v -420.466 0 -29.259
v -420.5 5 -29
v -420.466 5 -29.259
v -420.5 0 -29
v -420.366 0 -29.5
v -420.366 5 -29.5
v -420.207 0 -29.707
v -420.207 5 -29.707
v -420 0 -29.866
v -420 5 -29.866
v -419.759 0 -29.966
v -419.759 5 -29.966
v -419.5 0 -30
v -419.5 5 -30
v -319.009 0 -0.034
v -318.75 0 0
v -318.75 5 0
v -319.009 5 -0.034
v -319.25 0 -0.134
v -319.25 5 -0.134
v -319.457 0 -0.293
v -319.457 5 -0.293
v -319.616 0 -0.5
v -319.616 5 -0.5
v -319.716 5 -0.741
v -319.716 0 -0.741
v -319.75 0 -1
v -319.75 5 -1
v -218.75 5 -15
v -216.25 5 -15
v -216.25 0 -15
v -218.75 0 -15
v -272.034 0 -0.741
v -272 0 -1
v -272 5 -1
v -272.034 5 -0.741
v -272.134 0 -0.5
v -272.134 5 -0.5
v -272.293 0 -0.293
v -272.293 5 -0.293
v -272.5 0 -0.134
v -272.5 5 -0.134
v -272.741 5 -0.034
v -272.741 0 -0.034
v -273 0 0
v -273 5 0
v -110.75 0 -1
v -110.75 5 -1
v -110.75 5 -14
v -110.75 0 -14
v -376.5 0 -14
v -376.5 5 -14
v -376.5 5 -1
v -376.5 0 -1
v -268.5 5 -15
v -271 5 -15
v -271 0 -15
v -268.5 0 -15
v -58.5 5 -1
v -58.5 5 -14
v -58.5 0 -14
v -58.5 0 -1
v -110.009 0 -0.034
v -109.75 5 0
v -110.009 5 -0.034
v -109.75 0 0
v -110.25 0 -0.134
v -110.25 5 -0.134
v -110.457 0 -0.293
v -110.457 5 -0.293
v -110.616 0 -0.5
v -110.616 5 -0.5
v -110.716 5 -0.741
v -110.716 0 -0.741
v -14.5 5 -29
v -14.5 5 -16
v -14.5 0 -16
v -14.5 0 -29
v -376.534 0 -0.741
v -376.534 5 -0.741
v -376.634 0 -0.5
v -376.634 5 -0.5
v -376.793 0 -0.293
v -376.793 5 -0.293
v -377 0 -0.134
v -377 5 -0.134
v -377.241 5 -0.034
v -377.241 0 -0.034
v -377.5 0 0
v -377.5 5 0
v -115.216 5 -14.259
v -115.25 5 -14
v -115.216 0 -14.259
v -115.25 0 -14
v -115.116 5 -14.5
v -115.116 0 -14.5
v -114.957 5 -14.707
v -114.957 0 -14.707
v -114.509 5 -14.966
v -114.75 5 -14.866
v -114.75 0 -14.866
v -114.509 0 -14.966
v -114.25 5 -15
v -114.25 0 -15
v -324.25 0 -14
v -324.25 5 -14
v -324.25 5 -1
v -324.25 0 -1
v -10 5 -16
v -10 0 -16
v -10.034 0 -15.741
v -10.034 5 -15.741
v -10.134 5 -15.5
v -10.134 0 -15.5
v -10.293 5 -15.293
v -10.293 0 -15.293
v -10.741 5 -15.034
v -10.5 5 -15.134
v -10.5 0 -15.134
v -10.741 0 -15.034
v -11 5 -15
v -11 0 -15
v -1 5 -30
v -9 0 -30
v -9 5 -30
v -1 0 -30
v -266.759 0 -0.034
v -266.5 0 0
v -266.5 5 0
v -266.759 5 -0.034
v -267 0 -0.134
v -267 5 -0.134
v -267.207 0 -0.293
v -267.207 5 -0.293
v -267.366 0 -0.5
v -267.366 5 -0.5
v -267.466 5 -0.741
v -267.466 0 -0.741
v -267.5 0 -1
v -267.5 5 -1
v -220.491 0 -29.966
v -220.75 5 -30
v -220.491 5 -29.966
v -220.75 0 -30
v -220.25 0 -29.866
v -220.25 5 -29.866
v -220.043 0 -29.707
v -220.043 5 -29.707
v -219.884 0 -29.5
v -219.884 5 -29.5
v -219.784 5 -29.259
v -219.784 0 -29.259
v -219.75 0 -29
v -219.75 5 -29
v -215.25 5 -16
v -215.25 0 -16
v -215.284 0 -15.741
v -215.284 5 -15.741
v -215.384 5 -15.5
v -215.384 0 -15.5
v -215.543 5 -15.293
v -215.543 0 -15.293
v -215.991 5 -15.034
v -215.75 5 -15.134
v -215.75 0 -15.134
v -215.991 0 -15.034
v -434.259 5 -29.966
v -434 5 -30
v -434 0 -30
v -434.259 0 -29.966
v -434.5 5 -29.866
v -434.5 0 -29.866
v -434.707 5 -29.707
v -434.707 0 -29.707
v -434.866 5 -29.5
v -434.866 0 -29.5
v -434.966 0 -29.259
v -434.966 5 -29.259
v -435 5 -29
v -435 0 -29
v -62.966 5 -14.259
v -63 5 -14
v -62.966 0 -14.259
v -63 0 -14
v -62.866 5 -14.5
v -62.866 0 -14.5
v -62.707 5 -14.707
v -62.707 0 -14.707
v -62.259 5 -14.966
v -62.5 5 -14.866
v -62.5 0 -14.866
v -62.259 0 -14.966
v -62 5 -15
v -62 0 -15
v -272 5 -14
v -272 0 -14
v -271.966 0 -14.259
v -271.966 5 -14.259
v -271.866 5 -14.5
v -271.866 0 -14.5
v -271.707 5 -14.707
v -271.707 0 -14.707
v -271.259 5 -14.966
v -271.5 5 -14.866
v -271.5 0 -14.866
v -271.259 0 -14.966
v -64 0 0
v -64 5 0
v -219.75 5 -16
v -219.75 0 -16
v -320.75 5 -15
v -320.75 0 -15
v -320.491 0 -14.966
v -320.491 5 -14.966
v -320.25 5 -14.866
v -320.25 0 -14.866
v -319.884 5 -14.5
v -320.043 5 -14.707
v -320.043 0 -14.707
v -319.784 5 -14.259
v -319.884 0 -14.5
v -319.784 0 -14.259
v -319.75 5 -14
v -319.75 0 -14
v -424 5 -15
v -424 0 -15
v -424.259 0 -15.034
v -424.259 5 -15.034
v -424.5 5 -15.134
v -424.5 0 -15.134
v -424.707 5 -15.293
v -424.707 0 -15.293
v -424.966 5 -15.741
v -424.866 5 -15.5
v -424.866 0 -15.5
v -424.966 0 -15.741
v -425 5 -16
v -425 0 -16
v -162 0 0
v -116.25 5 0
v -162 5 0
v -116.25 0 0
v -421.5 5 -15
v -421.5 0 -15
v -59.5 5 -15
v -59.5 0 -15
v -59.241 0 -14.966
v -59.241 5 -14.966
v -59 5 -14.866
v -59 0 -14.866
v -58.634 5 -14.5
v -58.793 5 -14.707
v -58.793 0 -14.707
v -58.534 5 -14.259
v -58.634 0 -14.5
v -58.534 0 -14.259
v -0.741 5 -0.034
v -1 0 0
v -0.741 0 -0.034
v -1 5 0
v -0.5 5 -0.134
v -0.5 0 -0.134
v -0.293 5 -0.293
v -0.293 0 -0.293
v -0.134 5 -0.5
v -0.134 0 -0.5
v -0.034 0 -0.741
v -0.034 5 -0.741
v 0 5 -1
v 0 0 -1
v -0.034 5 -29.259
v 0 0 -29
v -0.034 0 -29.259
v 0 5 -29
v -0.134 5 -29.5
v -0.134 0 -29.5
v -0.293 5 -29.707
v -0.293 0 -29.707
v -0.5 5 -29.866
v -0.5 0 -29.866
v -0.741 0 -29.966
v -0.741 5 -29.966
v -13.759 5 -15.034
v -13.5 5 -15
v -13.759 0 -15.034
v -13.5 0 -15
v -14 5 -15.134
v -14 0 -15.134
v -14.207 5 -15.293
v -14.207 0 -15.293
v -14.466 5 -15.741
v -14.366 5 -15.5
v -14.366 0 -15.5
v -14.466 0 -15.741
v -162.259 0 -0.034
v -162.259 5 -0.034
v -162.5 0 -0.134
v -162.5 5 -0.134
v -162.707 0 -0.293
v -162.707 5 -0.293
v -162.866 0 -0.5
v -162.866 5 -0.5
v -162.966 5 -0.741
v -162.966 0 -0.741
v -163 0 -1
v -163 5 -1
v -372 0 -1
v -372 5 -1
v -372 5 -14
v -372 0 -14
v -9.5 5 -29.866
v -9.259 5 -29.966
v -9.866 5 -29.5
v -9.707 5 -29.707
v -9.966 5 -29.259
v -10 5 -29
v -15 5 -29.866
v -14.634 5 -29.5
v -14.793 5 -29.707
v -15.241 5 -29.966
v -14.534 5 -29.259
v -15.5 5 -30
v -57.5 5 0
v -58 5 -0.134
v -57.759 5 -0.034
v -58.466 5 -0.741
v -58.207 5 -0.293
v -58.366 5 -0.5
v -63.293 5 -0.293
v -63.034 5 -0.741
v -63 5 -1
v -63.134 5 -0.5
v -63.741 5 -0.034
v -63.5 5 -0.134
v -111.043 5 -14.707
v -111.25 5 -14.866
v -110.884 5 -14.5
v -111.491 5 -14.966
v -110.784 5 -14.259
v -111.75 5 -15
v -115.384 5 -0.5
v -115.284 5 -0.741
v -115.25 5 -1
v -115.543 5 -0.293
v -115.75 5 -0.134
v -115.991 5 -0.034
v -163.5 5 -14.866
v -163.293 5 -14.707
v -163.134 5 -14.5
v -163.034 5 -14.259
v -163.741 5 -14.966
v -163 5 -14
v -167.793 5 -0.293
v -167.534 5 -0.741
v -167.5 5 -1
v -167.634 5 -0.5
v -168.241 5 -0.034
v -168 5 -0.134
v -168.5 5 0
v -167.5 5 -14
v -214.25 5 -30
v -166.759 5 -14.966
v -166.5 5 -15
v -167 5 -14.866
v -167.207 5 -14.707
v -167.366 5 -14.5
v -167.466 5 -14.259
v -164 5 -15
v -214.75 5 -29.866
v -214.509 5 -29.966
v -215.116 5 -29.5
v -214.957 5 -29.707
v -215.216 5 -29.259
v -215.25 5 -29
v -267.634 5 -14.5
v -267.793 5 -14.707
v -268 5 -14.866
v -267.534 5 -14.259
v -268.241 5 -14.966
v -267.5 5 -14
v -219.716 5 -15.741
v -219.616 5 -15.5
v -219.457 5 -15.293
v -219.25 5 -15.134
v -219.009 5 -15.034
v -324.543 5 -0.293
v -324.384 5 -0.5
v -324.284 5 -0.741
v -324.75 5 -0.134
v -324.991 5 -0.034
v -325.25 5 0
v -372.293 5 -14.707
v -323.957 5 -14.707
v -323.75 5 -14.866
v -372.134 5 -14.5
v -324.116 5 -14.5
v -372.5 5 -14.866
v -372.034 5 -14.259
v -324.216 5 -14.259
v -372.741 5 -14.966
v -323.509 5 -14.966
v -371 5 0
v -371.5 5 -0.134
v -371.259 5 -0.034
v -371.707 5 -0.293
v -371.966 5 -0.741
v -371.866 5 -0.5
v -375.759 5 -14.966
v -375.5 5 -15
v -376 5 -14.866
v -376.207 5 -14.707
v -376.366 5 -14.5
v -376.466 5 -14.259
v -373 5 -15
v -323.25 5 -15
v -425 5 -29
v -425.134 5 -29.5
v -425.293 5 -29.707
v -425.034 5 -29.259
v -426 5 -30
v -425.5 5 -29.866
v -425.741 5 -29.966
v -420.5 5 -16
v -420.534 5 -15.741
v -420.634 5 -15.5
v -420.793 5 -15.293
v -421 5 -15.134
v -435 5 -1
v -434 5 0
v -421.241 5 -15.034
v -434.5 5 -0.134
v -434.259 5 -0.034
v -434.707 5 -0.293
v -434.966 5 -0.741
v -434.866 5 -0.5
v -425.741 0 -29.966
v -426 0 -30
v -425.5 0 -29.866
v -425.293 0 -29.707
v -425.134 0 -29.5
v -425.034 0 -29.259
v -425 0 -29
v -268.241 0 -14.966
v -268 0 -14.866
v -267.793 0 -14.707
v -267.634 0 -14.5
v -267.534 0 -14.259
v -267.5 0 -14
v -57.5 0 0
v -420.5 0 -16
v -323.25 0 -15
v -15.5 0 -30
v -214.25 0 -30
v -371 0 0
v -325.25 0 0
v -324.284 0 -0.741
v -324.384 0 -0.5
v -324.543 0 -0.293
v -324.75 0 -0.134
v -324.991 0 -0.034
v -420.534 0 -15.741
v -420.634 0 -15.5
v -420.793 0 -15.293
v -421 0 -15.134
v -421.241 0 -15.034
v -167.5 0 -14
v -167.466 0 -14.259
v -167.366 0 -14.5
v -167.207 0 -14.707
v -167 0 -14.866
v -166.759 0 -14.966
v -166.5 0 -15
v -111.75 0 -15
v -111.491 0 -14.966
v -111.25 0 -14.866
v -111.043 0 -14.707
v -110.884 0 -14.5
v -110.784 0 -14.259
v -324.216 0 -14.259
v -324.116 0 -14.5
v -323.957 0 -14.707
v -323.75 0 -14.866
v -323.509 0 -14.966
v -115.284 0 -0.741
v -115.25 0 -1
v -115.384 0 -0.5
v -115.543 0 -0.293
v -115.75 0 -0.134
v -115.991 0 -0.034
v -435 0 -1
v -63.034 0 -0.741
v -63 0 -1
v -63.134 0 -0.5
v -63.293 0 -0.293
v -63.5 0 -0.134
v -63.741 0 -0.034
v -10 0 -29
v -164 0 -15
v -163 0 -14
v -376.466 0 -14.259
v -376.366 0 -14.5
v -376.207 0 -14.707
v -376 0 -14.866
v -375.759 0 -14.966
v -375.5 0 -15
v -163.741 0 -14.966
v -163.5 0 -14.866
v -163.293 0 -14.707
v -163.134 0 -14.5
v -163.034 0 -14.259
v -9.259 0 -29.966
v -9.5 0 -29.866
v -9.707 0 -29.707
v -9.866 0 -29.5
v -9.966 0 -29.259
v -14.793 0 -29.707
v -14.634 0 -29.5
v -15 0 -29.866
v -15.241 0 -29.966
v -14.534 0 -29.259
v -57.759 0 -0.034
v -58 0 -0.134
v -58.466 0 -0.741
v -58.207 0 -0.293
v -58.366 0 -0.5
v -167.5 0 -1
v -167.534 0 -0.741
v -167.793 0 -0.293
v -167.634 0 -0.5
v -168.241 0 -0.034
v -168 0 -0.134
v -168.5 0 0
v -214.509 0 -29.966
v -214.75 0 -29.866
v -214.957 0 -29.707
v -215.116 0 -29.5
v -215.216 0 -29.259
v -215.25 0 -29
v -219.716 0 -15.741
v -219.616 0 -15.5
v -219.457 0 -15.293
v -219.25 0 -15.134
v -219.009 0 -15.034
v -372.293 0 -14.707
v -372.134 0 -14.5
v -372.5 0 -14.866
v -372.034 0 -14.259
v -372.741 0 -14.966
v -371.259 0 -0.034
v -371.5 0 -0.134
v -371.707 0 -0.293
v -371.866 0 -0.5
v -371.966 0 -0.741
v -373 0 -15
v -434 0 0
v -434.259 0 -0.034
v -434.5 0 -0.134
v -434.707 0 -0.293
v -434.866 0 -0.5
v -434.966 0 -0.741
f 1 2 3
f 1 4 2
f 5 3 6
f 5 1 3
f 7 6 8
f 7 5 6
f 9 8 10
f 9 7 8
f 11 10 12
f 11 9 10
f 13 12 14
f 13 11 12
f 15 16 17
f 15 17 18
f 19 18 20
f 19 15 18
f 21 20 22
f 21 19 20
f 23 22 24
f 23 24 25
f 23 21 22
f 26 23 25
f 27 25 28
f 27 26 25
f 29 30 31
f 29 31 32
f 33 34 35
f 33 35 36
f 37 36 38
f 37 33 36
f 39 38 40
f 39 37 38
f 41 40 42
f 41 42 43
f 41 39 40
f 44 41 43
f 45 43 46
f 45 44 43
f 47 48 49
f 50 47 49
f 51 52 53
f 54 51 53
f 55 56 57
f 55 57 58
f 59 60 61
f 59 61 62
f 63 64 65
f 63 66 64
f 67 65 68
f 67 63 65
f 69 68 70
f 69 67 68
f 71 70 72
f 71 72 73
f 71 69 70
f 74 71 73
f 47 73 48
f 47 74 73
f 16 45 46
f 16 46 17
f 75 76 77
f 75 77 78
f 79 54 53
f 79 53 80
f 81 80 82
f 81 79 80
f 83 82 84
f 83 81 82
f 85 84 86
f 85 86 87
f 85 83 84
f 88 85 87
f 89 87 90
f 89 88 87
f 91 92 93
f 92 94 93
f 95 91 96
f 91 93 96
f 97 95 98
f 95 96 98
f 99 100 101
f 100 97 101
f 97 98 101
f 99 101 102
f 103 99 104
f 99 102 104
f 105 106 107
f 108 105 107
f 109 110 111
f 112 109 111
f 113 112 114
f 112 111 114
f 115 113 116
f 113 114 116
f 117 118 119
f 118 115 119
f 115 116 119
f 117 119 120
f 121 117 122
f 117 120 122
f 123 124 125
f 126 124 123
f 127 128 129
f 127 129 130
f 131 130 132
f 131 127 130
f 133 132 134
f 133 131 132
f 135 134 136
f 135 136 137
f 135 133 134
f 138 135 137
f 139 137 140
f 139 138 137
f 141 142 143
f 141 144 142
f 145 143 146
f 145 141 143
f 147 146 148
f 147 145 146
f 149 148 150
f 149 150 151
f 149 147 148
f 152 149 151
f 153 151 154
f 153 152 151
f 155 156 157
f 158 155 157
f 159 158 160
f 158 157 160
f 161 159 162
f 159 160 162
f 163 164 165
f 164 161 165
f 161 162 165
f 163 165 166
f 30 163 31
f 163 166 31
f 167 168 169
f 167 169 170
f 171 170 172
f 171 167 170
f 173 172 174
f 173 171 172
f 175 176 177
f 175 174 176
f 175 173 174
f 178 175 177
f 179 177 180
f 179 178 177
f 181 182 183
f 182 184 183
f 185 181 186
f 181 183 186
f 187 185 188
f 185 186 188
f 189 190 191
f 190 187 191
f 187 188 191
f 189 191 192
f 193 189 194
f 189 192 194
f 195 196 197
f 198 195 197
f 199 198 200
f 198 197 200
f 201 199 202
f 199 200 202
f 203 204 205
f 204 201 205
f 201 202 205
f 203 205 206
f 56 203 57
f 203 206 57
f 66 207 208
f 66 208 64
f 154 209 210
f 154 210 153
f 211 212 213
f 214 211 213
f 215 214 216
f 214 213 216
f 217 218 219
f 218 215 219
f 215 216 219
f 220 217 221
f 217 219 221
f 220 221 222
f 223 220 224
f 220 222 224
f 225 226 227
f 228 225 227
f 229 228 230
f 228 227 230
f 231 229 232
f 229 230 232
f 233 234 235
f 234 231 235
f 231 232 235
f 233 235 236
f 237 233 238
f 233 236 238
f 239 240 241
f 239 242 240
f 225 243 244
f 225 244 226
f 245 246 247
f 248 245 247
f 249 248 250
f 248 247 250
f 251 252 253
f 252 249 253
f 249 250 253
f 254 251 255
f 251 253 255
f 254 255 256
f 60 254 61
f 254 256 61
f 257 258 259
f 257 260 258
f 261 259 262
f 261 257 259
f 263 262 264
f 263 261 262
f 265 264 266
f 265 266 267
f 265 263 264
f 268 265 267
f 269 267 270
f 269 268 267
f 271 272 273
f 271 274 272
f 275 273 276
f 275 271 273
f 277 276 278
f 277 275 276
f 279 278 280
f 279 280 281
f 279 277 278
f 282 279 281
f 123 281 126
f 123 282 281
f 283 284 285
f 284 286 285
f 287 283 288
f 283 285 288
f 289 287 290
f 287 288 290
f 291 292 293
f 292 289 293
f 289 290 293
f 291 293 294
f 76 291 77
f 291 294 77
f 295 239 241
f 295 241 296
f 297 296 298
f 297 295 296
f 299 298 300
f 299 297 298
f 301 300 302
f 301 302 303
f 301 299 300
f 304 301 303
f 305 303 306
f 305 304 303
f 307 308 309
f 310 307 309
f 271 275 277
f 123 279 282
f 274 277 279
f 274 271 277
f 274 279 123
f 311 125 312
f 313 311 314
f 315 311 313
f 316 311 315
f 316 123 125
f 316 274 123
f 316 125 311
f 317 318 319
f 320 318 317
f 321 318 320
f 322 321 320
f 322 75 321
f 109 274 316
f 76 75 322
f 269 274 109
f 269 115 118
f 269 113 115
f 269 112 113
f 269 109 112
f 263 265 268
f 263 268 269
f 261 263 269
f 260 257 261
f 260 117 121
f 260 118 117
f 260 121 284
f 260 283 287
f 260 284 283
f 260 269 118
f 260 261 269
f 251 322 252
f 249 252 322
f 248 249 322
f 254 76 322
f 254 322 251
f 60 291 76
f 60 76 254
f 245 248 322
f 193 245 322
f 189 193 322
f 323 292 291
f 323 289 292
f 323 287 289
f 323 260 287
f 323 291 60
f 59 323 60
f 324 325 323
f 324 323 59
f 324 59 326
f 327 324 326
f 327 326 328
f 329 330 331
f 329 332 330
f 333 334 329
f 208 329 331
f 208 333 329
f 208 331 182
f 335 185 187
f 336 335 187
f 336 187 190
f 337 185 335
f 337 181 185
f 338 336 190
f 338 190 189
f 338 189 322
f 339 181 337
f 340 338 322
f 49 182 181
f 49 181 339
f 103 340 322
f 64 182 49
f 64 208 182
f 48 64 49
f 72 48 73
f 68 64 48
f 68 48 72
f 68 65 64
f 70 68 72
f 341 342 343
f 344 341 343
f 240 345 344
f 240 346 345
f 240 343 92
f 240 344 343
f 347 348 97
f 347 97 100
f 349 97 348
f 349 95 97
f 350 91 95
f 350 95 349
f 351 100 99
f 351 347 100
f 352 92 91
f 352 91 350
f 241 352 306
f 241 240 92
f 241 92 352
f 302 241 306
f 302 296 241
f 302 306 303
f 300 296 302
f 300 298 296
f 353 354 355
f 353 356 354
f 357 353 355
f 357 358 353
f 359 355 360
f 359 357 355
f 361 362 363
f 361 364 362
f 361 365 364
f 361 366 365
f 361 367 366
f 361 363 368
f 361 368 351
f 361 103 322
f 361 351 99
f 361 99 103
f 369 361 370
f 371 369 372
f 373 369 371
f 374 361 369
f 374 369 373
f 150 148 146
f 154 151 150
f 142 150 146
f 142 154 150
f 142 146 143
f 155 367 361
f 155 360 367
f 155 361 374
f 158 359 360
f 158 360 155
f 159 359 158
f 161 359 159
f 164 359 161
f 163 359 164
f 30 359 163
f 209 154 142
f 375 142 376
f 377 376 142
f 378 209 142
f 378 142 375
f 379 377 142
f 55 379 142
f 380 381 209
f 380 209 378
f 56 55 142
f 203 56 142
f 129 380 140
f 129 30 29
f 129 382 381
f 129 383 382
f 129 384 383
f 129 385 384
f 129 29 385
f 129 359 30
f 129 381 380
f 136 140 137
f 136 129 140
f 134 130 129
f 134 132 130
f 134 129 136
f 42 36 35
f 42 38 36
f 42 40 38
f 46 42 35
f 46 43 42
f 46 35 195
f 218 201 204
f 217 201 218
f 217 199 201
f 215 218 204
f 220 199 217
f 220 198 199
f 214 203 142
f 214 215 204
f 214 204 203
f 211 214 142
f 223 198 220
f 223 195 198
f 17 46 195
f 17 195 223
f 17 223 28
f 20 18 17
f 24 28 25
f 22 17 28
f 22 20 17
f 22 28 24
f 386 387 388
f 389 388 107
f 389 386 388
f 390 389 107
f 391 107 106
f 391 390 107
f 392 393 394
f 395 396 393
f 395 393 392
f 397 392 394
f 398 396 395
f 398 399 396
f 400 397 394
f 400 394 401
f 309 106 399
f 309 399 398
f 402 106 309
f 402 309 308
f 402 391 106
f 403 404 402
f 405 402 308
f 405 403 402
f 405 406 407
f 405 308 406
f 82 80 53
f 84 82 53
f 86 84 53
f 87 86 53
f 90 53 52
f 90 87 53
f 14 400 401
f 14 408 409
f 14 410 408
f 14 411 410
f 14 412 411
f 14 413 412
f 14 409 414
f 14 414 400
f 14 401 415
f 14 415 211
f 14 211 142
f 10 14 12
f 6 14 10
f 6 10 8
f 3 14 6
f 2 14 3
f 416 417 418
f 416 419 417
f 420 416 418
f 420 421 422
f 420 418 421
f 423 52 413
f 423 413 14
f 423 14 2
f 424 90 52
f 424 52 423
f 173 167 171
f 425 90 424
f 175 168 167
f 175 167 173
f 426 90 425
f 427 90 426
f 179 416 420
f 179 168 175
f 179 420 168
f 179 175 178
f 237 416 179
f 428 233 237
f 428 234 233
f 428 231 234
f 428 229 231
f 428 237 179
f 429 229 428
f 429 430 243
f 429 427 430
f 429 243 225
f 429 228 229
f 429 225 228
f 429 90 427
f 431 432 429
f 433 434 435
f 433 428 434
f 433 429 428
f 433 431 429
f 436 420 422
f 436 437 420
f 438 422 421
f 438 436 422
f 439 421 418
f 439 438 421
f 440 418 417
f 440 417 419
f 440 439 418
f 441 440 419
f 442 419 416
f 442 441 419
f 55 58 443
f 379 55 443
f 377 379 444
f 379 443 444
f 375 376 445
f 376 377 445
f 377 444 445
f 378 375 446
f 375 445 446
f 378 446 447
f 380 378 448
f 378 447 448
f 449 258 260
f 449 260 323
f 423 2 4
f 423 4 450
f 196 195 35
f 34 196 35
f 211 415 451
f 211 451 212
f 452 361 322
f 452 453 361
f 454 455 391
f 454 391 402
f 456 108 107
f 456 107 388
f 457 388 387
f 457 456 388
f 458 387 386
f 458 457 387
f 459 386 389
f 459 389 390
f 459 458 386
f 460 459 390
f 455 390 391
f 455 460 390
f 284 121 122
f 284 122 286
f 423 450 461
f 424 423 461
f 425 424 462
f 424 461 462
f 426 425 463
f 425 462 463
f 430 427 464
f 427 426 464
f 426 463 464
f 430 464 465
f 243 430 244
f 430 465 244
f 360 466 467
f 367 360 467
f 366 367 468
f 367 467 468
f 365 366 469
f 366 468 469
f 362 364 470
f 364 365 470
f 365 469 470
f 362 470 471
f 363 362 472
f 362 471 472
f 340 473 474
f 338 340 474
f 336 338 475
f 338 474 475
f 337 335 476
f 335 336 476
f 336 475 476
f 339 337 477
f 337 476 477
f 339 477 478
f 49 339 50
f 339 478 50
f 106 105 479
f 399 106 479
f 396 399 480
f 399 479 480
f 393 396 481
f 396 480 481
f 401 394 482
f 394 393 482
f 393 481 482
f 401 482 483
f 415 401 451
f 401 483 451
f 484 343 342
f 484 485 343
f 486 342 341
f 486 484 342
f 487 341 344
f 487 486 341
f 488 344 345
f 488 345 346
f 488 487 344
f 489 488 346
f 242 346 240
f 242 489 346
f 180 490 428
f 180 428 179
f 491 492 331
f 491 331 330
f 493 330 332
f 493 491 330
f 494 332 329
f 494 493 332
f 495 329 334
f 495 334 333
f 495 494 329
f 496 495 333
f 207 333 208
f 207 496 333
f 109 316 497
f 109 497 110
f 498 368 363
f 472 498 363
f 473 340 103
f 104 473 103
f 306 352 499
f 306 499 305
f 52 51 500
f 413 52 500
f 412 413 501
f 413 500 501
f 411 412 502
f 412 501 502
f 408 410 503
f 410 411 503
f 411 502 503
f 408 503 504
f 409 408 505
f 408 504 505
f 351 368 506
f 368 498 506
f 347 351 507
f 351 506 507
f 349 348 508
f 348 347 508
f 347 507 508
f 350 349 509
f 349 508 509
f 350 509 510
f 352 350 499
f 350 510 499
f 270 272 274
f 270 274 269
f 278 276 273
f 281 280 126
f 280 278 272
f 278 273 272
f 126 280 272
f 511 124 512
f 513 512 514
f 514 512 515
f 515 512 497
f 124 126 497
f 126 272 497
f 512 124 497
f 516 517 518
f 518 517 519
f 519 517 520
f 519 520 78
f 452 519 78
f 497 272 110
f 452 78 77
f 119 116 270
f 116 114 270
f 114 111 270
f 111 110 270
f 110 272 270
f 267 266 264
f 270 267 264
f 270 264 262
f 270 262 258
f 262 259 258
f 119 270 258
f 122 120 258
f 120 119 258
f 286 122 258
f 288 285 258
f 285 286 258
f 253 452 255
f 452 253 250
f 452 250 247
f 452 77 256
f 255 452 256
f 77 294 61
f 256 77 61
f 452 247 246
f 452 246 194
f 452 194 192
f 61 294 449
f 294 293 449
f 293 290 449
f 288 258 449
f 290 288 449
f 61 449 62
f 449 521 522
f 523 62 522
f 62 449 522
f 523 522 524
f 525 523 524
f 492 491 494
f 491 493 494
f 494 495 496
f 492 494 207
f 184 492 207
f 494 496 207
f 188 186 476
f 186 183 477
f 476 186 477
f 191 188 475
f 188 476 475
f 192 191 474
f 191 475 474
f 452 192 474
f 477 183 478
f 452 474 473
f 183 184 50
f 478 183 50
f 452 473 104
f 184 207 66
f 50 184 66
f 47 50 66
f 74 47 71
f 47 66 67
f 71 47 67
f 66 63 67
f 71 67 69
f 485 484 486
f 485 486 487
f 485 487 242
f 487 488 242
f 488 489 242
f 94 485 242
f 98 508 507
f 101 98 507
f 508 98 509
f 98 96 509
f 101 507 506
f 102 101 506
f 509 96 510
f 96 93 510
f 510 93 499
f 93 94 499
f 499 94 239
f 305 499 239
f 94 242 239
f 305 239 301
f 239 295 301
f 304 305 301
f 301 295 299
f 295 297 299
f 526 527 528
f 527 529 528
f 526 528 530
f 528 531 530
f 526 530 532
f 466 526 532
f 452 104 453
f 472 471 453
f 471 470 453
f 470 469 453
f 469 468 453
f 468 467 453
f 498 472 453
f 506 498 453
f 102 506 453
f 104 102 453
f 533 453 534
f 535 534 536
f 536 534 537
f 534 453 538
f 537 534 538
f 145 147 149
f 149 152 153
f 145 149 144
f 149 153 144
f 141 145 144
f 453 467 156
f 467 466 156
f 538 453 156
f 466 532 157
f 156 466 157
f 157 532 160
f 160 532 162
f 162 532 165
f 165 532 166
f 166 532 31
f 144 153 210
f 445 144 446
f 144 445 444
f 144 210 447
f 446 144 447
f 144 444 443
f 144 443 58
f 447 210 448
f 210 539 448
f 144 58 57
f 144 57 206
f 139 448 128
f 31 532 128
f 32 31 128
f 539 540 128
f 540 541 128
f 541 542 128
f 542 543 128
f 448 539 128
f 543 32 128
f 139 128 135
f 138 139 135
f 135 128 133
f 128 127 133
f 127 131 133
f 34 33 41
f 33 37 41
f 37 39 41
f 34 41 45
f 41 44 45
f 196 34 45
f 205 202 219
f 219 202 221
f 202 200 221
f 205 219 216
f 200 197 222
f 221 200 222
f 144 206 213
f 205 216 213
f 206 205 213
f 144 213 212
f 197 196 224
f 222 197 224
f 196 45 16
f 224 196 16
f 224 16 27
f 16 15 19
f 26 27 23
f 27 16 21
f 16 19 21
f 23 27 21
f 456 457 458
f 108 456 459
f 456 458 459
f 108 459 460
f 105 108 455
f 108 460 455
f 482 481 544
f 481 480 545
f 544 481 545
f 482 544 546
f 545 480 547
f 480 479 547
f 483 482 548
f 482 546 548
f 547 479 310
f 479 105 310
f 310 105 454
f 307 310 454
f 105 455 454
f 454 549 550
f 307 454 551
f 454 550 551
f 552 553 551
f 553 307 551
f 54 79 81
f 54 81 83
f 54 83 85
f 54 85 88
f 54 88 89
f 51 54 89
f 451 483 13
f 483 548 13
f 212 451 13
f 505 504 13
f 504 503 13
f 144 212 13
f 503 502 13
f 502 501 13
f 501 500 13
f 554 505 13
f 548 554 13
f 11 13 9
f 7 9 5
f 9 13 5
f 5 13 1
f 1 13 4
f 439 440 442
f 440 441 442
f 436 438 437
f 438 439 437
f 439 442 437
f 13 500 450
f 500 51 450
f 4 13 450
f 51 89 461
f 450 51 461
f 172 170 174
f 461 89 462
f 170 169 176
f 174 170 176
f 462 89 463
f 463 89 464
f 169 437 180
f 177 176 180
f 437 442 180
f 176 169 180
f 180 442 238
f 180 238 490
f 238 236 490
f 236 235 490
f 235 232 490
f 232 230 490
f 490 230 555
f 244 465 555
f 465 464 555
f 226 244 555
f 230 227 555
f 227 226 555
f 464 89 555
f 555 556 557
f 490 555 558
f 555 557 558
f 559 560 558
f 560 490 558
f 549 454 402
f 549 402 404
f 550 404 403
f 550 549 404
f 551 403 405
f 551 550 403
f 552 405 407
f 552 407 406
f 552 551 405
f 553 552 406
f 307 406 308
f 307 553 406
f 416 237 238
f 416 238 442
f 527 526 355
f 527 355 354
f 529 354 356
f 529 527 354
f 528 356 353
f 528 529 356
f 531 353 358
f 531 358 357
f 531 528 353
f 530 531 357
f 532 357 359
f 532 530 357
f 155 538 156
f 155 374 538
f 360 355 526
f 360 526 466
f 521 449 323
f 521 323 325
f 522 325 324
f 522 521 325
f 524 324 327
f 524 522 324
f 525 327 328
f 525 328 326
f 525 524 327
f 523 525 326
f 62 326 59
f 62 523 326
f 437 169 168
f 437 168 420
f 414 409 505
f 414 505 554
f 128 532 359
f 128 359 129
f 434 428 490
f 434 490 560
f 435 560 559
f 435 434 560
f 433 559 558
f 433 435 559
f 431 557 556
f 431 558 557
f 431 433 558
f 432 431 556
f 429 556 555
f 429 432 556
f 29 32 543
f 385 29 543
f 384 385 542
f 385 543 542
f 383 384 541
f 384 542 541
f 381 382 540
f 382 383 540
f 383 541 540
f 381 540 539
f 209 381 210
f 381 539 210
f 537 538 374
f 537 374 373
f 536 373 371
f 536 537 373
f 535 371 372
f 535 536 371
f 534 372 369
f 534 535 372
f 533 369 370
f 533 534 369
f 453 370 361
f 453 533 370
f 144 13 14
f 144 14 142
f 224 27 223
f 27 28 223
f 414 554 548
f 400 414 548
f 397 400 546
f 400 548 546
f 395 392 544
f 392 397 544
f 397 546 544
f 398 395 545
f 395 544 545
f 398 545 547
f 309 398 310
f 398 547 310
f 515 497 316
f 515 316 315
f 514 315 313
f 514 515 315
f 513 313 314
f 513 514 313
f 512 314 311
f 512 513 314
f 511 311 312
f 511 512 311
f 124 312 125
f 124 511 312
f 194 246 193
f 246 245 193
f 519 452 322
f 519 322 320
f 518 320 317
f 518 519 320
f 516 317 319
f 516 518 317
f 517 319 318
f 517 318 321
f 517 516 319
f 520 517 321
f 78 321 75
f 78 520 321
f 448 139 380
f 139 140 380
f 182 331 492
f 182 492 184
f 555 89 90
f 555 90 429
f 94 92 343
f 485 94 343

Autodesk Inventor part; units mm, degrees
ref_plane "YZ Plane" through (0, 0, 0) normal (1, 0, 0) x (0, 1, 0)
ref_plane "XZ Plane" through (0, 0, 0) normal (0, 1, 0) x (-1, 0, 0)
ref_plane "XY Plane" through (0, 0, 0) normal (0, 0, 1) x (1, 0, 0)
sketch "Sketch1" plane through (0, 0, 0) normal (0, 1, 0) x (-1, 0, 0)
  line L0 (0, 0) -> (435, 0)
  line L1 (435, 0) -> (435, -30)
  line L2 (435, -30) -> (0, -30)
  line L3 (0, -30) -> (0, 0)
  dimension "d0" = 435
  dimension "d1" = 30
extrude "Extrusion1" add sketch "Sketch1" along normal blind 5
sketch "Sketch2" plane through (0, 5, 0) normal (0, 1, 0) x (1, 0, 0)
  line L0 (0, 30) -> (-435, 30) projected
  line L1 (-435, 30) -> (-425, 30)
  line L2 (-425, 30) -> (-420.5, 30)
  line L3 (-420.5, 30) -> (-420.5, 15)
  line L4 (-420.5, 15) -> (-425, 15)
  line L5 (-425, 15) -> (-425, 30)
  line L6 (-420.5, 30) -> (-219.75, 30)
  line L7 (-219.75, 30) -> (-215.25, 30)
  line L8 (-215.25, 30) -> (-215.25, 15)
  line L9 (-215.25, 15) -> (-219.75, 15)
  line L10 (-219.75, 15) -> (-219.75, 30)
  line L11 (-215.25, 30) -> (-14.5, 30)
  line L12 (-14.5, 30) -> (-10, 30)
  line L13 (-10, 30) -> (-10, 15)
  line L14 (-10, 15) -> (-14.5, 15)
  line L15 (-14.5, 15) -> (-14.5, 30)
  point P0 (0, 0)
  dimension "d4" = 10
  dimension "d5" = 4.5
  dimension "d6" = 15
  dimension "d7" = 200.75
  dimension "d8" = 4.5
  dimension "d9" = 15
  dimension "d10" = 200.75
  dimension "d11" = 4.5
  dimension "d12" = 15
extrude "Extrusion2" cut sketch "Sketch2" against normal blind 5
sketch "Sketch6" plane through (0, 5, 0) normal (0, 1, 0) x (1, 0, 0)
  line L0 (-14.5, 30) -> (-14.5, 15) projected
  line L1 (-14.5, 15) -> (-58.5, 15)
  line L2 (-14.5, 30) -> (-215.25, 30) projected
  line L3 (-58.5, 15) -> (-63, 15)
  line L4 (-63, 15) -> (-63, 30)
  line L5 (-63, 30) -> (-58.5, 30)
  line L6 (-58.5, 30) -> (-58.5, 15)
  line L7 (-63, 15) -> (-110.75, 15)
  line L8 (-110.75, 15) -> (-115.25, 15)
  line L9 (-115.25, 15) -> (-115.25, 30)
  line L10 (-115.25, 30) -> (-110.75, 30)
  line L11 (-110.75, 30) -> (-110.75, 15)
  line L12 (-115.25, 15) -> (-163, 15)
  line L13 (-163, 15) -> (-167.5, 15)
  line L14 (-167.5, 15) -> (-167.5, 30)
  line L15 (-167.5, 30) -> (-163, 30)
  line L16 (-163, 30) -> (-163, 15)
  line L17 (-435, 0) -> (0, 0) projected
  line L18 (-217.5, 0) -> (-217.5, 47.2454)
  line L19 (-376.5, 15) -> (-372, 15)
  line L20 (-372, 15) -> (-372, 30)
  line L21 (-372, 30) -> (-376.5, 30)
  line L22 (-376.5, 30) -> (-376.5, 15)
  line L23 (-372, 15) -> (-324.25, 15)
  line L24 (-324.25, 15) -> (-319.75, 15)
  line L25 (-319.75, 15) -> (-319.75, 30)
  line L26 (-319.75, 30) -> (-324.25, 30)
  line L27 (-324.25, 30) -> (-324.25, 15)
  line L28 (-319.75, 15) -> (-272, 15)
  line L29 (-272, 15) -> (-267.5, 15)
  line L30 (-267.5, 15) -> (-267.5, 30)
  line L31 (-267.5, 30) -> (-272, 30)
  line L32 (-272, 30) -> (-272, 15)
  line L33 (-110.75, 15) -> (-115.25, 15)
  line L34 (-115.25, 15) -> (-115.25, 0)
  line L35 (-115.25, 0) -> (-110.75, 0)
  line L36 (-110.75, 0) -> (-110.75, 15)
  line L37 (-319.75, 15) -> (-324.25, 15)
  line L38 (-324.25, 15) -> (-324.25, 0)
  line L39 (-324.25, 0) -> (-319.75, 0)
  line L40 (-319.75, 0) -> (-319.75, 15)
  line L41 (-58.5, 0) -> (-63, 0)
  line L42 (-63, 0) -> (-63, 15)
  line L43 (-63, 15) -> (-58.5, 15)
  line L44 (-58.5, 15) -> (-58.5, 0)
  line L45 (-163, 0) -> (-167.5, 0)
  line L46 (-167.5, 0) -> (-167.5, 15)
  line L47 (-167.5, 15) -> (-163, 15)
  line L48 (-163, 15) -> (-163, 0)
  line L49 (-267.5, 15) -> (-272, 15)
  line L50 (-272, 15) -> (-272, 0)
  line L51 (-272, 0) -> (-267.5, 0)
  line L52 (-267.5, 0) -> (-267.5, 15)
  line L53 (-372, 15) -> (-376.5, 15)
  line L54 (-376.5, 15) -> (-376.5, 0)
  line L55 (-376.5, 0) -> (-372, 0)
  line L56 (-372, 0) -> (-372, 15)
  line L57 (-435, 30) -> (-435, 0) projected
  dimension "d40" = 44
  dimension "d41" = 4.5
  dimension "d42" = 47.75
  dimension "d43" = 4.5
  dimension "d44" = 47.75
  dimension "d45" = 4.5
  dimension "d48" = 15
  dimension "d49" = 4.5
  dimension "d50" = 106.75
  dimension "d51" = 58.5
  dimension "d52" = 54.5
extrude "Extrusion6" cut sketch "Sketch6" against normal blind 5 contours L17 L50 L29 L52 | L44 L17 L42 L3 | L36 L17 L34 L8 | L48 L17 L46 L13 | L17 L38 L24 L40 | L17 L54 L19 L56
fillet "Fillet2" radius 1 40 edges at (-324.25, 2.5, -15) (-319.75, 2.5, -15) (-372, 2.5, -15) (-376.5, 2.5, -15) (-425, 2.5, -15) (-420.5, 2.5, -15) (-267.5, 2.5, -15) (-272, 2.5, -15) (-215.25, 2.5, -15) (-219.75, 2.5, -15) (-167.5, 2.5, -15) (-163, 2.5, -15) (-115.25, 2.5, -15) (-110.75, 2.5, -15) (-63, 2.5, -15) (-58.5, 2.5, -15) (-14.5, 2.5, -15) (-10, 2.5, -15) (-58.5, 2.5, 0) (-63, 2.5, 0) (-110.75, 2.5, 0) (-115.25, 2.5, 0) (-163, 2.5, 0) (-167.5, 2.5, 0) (-215.25, 2.5, -30) (-219.75, 2.5, -30) (-267.5, 2.5, 0) (-272, 2.5, 0) (-319.75, 2.5, 0) (-324.25, 2.5, 0) (-372, 2.5, 0) (-376.5, 2.5, 0) (-435, 2.5, 0) (-435, 2.5, -30) (-425, 2.5, -30) (-420.5, 2.5, -30) (0, 2.5, 0) (-10, 2.5, -30) (-14.5, 2.5, -30) (0, 2.5, -30)
properties part number "slats_under" material "Foam Core Board"
